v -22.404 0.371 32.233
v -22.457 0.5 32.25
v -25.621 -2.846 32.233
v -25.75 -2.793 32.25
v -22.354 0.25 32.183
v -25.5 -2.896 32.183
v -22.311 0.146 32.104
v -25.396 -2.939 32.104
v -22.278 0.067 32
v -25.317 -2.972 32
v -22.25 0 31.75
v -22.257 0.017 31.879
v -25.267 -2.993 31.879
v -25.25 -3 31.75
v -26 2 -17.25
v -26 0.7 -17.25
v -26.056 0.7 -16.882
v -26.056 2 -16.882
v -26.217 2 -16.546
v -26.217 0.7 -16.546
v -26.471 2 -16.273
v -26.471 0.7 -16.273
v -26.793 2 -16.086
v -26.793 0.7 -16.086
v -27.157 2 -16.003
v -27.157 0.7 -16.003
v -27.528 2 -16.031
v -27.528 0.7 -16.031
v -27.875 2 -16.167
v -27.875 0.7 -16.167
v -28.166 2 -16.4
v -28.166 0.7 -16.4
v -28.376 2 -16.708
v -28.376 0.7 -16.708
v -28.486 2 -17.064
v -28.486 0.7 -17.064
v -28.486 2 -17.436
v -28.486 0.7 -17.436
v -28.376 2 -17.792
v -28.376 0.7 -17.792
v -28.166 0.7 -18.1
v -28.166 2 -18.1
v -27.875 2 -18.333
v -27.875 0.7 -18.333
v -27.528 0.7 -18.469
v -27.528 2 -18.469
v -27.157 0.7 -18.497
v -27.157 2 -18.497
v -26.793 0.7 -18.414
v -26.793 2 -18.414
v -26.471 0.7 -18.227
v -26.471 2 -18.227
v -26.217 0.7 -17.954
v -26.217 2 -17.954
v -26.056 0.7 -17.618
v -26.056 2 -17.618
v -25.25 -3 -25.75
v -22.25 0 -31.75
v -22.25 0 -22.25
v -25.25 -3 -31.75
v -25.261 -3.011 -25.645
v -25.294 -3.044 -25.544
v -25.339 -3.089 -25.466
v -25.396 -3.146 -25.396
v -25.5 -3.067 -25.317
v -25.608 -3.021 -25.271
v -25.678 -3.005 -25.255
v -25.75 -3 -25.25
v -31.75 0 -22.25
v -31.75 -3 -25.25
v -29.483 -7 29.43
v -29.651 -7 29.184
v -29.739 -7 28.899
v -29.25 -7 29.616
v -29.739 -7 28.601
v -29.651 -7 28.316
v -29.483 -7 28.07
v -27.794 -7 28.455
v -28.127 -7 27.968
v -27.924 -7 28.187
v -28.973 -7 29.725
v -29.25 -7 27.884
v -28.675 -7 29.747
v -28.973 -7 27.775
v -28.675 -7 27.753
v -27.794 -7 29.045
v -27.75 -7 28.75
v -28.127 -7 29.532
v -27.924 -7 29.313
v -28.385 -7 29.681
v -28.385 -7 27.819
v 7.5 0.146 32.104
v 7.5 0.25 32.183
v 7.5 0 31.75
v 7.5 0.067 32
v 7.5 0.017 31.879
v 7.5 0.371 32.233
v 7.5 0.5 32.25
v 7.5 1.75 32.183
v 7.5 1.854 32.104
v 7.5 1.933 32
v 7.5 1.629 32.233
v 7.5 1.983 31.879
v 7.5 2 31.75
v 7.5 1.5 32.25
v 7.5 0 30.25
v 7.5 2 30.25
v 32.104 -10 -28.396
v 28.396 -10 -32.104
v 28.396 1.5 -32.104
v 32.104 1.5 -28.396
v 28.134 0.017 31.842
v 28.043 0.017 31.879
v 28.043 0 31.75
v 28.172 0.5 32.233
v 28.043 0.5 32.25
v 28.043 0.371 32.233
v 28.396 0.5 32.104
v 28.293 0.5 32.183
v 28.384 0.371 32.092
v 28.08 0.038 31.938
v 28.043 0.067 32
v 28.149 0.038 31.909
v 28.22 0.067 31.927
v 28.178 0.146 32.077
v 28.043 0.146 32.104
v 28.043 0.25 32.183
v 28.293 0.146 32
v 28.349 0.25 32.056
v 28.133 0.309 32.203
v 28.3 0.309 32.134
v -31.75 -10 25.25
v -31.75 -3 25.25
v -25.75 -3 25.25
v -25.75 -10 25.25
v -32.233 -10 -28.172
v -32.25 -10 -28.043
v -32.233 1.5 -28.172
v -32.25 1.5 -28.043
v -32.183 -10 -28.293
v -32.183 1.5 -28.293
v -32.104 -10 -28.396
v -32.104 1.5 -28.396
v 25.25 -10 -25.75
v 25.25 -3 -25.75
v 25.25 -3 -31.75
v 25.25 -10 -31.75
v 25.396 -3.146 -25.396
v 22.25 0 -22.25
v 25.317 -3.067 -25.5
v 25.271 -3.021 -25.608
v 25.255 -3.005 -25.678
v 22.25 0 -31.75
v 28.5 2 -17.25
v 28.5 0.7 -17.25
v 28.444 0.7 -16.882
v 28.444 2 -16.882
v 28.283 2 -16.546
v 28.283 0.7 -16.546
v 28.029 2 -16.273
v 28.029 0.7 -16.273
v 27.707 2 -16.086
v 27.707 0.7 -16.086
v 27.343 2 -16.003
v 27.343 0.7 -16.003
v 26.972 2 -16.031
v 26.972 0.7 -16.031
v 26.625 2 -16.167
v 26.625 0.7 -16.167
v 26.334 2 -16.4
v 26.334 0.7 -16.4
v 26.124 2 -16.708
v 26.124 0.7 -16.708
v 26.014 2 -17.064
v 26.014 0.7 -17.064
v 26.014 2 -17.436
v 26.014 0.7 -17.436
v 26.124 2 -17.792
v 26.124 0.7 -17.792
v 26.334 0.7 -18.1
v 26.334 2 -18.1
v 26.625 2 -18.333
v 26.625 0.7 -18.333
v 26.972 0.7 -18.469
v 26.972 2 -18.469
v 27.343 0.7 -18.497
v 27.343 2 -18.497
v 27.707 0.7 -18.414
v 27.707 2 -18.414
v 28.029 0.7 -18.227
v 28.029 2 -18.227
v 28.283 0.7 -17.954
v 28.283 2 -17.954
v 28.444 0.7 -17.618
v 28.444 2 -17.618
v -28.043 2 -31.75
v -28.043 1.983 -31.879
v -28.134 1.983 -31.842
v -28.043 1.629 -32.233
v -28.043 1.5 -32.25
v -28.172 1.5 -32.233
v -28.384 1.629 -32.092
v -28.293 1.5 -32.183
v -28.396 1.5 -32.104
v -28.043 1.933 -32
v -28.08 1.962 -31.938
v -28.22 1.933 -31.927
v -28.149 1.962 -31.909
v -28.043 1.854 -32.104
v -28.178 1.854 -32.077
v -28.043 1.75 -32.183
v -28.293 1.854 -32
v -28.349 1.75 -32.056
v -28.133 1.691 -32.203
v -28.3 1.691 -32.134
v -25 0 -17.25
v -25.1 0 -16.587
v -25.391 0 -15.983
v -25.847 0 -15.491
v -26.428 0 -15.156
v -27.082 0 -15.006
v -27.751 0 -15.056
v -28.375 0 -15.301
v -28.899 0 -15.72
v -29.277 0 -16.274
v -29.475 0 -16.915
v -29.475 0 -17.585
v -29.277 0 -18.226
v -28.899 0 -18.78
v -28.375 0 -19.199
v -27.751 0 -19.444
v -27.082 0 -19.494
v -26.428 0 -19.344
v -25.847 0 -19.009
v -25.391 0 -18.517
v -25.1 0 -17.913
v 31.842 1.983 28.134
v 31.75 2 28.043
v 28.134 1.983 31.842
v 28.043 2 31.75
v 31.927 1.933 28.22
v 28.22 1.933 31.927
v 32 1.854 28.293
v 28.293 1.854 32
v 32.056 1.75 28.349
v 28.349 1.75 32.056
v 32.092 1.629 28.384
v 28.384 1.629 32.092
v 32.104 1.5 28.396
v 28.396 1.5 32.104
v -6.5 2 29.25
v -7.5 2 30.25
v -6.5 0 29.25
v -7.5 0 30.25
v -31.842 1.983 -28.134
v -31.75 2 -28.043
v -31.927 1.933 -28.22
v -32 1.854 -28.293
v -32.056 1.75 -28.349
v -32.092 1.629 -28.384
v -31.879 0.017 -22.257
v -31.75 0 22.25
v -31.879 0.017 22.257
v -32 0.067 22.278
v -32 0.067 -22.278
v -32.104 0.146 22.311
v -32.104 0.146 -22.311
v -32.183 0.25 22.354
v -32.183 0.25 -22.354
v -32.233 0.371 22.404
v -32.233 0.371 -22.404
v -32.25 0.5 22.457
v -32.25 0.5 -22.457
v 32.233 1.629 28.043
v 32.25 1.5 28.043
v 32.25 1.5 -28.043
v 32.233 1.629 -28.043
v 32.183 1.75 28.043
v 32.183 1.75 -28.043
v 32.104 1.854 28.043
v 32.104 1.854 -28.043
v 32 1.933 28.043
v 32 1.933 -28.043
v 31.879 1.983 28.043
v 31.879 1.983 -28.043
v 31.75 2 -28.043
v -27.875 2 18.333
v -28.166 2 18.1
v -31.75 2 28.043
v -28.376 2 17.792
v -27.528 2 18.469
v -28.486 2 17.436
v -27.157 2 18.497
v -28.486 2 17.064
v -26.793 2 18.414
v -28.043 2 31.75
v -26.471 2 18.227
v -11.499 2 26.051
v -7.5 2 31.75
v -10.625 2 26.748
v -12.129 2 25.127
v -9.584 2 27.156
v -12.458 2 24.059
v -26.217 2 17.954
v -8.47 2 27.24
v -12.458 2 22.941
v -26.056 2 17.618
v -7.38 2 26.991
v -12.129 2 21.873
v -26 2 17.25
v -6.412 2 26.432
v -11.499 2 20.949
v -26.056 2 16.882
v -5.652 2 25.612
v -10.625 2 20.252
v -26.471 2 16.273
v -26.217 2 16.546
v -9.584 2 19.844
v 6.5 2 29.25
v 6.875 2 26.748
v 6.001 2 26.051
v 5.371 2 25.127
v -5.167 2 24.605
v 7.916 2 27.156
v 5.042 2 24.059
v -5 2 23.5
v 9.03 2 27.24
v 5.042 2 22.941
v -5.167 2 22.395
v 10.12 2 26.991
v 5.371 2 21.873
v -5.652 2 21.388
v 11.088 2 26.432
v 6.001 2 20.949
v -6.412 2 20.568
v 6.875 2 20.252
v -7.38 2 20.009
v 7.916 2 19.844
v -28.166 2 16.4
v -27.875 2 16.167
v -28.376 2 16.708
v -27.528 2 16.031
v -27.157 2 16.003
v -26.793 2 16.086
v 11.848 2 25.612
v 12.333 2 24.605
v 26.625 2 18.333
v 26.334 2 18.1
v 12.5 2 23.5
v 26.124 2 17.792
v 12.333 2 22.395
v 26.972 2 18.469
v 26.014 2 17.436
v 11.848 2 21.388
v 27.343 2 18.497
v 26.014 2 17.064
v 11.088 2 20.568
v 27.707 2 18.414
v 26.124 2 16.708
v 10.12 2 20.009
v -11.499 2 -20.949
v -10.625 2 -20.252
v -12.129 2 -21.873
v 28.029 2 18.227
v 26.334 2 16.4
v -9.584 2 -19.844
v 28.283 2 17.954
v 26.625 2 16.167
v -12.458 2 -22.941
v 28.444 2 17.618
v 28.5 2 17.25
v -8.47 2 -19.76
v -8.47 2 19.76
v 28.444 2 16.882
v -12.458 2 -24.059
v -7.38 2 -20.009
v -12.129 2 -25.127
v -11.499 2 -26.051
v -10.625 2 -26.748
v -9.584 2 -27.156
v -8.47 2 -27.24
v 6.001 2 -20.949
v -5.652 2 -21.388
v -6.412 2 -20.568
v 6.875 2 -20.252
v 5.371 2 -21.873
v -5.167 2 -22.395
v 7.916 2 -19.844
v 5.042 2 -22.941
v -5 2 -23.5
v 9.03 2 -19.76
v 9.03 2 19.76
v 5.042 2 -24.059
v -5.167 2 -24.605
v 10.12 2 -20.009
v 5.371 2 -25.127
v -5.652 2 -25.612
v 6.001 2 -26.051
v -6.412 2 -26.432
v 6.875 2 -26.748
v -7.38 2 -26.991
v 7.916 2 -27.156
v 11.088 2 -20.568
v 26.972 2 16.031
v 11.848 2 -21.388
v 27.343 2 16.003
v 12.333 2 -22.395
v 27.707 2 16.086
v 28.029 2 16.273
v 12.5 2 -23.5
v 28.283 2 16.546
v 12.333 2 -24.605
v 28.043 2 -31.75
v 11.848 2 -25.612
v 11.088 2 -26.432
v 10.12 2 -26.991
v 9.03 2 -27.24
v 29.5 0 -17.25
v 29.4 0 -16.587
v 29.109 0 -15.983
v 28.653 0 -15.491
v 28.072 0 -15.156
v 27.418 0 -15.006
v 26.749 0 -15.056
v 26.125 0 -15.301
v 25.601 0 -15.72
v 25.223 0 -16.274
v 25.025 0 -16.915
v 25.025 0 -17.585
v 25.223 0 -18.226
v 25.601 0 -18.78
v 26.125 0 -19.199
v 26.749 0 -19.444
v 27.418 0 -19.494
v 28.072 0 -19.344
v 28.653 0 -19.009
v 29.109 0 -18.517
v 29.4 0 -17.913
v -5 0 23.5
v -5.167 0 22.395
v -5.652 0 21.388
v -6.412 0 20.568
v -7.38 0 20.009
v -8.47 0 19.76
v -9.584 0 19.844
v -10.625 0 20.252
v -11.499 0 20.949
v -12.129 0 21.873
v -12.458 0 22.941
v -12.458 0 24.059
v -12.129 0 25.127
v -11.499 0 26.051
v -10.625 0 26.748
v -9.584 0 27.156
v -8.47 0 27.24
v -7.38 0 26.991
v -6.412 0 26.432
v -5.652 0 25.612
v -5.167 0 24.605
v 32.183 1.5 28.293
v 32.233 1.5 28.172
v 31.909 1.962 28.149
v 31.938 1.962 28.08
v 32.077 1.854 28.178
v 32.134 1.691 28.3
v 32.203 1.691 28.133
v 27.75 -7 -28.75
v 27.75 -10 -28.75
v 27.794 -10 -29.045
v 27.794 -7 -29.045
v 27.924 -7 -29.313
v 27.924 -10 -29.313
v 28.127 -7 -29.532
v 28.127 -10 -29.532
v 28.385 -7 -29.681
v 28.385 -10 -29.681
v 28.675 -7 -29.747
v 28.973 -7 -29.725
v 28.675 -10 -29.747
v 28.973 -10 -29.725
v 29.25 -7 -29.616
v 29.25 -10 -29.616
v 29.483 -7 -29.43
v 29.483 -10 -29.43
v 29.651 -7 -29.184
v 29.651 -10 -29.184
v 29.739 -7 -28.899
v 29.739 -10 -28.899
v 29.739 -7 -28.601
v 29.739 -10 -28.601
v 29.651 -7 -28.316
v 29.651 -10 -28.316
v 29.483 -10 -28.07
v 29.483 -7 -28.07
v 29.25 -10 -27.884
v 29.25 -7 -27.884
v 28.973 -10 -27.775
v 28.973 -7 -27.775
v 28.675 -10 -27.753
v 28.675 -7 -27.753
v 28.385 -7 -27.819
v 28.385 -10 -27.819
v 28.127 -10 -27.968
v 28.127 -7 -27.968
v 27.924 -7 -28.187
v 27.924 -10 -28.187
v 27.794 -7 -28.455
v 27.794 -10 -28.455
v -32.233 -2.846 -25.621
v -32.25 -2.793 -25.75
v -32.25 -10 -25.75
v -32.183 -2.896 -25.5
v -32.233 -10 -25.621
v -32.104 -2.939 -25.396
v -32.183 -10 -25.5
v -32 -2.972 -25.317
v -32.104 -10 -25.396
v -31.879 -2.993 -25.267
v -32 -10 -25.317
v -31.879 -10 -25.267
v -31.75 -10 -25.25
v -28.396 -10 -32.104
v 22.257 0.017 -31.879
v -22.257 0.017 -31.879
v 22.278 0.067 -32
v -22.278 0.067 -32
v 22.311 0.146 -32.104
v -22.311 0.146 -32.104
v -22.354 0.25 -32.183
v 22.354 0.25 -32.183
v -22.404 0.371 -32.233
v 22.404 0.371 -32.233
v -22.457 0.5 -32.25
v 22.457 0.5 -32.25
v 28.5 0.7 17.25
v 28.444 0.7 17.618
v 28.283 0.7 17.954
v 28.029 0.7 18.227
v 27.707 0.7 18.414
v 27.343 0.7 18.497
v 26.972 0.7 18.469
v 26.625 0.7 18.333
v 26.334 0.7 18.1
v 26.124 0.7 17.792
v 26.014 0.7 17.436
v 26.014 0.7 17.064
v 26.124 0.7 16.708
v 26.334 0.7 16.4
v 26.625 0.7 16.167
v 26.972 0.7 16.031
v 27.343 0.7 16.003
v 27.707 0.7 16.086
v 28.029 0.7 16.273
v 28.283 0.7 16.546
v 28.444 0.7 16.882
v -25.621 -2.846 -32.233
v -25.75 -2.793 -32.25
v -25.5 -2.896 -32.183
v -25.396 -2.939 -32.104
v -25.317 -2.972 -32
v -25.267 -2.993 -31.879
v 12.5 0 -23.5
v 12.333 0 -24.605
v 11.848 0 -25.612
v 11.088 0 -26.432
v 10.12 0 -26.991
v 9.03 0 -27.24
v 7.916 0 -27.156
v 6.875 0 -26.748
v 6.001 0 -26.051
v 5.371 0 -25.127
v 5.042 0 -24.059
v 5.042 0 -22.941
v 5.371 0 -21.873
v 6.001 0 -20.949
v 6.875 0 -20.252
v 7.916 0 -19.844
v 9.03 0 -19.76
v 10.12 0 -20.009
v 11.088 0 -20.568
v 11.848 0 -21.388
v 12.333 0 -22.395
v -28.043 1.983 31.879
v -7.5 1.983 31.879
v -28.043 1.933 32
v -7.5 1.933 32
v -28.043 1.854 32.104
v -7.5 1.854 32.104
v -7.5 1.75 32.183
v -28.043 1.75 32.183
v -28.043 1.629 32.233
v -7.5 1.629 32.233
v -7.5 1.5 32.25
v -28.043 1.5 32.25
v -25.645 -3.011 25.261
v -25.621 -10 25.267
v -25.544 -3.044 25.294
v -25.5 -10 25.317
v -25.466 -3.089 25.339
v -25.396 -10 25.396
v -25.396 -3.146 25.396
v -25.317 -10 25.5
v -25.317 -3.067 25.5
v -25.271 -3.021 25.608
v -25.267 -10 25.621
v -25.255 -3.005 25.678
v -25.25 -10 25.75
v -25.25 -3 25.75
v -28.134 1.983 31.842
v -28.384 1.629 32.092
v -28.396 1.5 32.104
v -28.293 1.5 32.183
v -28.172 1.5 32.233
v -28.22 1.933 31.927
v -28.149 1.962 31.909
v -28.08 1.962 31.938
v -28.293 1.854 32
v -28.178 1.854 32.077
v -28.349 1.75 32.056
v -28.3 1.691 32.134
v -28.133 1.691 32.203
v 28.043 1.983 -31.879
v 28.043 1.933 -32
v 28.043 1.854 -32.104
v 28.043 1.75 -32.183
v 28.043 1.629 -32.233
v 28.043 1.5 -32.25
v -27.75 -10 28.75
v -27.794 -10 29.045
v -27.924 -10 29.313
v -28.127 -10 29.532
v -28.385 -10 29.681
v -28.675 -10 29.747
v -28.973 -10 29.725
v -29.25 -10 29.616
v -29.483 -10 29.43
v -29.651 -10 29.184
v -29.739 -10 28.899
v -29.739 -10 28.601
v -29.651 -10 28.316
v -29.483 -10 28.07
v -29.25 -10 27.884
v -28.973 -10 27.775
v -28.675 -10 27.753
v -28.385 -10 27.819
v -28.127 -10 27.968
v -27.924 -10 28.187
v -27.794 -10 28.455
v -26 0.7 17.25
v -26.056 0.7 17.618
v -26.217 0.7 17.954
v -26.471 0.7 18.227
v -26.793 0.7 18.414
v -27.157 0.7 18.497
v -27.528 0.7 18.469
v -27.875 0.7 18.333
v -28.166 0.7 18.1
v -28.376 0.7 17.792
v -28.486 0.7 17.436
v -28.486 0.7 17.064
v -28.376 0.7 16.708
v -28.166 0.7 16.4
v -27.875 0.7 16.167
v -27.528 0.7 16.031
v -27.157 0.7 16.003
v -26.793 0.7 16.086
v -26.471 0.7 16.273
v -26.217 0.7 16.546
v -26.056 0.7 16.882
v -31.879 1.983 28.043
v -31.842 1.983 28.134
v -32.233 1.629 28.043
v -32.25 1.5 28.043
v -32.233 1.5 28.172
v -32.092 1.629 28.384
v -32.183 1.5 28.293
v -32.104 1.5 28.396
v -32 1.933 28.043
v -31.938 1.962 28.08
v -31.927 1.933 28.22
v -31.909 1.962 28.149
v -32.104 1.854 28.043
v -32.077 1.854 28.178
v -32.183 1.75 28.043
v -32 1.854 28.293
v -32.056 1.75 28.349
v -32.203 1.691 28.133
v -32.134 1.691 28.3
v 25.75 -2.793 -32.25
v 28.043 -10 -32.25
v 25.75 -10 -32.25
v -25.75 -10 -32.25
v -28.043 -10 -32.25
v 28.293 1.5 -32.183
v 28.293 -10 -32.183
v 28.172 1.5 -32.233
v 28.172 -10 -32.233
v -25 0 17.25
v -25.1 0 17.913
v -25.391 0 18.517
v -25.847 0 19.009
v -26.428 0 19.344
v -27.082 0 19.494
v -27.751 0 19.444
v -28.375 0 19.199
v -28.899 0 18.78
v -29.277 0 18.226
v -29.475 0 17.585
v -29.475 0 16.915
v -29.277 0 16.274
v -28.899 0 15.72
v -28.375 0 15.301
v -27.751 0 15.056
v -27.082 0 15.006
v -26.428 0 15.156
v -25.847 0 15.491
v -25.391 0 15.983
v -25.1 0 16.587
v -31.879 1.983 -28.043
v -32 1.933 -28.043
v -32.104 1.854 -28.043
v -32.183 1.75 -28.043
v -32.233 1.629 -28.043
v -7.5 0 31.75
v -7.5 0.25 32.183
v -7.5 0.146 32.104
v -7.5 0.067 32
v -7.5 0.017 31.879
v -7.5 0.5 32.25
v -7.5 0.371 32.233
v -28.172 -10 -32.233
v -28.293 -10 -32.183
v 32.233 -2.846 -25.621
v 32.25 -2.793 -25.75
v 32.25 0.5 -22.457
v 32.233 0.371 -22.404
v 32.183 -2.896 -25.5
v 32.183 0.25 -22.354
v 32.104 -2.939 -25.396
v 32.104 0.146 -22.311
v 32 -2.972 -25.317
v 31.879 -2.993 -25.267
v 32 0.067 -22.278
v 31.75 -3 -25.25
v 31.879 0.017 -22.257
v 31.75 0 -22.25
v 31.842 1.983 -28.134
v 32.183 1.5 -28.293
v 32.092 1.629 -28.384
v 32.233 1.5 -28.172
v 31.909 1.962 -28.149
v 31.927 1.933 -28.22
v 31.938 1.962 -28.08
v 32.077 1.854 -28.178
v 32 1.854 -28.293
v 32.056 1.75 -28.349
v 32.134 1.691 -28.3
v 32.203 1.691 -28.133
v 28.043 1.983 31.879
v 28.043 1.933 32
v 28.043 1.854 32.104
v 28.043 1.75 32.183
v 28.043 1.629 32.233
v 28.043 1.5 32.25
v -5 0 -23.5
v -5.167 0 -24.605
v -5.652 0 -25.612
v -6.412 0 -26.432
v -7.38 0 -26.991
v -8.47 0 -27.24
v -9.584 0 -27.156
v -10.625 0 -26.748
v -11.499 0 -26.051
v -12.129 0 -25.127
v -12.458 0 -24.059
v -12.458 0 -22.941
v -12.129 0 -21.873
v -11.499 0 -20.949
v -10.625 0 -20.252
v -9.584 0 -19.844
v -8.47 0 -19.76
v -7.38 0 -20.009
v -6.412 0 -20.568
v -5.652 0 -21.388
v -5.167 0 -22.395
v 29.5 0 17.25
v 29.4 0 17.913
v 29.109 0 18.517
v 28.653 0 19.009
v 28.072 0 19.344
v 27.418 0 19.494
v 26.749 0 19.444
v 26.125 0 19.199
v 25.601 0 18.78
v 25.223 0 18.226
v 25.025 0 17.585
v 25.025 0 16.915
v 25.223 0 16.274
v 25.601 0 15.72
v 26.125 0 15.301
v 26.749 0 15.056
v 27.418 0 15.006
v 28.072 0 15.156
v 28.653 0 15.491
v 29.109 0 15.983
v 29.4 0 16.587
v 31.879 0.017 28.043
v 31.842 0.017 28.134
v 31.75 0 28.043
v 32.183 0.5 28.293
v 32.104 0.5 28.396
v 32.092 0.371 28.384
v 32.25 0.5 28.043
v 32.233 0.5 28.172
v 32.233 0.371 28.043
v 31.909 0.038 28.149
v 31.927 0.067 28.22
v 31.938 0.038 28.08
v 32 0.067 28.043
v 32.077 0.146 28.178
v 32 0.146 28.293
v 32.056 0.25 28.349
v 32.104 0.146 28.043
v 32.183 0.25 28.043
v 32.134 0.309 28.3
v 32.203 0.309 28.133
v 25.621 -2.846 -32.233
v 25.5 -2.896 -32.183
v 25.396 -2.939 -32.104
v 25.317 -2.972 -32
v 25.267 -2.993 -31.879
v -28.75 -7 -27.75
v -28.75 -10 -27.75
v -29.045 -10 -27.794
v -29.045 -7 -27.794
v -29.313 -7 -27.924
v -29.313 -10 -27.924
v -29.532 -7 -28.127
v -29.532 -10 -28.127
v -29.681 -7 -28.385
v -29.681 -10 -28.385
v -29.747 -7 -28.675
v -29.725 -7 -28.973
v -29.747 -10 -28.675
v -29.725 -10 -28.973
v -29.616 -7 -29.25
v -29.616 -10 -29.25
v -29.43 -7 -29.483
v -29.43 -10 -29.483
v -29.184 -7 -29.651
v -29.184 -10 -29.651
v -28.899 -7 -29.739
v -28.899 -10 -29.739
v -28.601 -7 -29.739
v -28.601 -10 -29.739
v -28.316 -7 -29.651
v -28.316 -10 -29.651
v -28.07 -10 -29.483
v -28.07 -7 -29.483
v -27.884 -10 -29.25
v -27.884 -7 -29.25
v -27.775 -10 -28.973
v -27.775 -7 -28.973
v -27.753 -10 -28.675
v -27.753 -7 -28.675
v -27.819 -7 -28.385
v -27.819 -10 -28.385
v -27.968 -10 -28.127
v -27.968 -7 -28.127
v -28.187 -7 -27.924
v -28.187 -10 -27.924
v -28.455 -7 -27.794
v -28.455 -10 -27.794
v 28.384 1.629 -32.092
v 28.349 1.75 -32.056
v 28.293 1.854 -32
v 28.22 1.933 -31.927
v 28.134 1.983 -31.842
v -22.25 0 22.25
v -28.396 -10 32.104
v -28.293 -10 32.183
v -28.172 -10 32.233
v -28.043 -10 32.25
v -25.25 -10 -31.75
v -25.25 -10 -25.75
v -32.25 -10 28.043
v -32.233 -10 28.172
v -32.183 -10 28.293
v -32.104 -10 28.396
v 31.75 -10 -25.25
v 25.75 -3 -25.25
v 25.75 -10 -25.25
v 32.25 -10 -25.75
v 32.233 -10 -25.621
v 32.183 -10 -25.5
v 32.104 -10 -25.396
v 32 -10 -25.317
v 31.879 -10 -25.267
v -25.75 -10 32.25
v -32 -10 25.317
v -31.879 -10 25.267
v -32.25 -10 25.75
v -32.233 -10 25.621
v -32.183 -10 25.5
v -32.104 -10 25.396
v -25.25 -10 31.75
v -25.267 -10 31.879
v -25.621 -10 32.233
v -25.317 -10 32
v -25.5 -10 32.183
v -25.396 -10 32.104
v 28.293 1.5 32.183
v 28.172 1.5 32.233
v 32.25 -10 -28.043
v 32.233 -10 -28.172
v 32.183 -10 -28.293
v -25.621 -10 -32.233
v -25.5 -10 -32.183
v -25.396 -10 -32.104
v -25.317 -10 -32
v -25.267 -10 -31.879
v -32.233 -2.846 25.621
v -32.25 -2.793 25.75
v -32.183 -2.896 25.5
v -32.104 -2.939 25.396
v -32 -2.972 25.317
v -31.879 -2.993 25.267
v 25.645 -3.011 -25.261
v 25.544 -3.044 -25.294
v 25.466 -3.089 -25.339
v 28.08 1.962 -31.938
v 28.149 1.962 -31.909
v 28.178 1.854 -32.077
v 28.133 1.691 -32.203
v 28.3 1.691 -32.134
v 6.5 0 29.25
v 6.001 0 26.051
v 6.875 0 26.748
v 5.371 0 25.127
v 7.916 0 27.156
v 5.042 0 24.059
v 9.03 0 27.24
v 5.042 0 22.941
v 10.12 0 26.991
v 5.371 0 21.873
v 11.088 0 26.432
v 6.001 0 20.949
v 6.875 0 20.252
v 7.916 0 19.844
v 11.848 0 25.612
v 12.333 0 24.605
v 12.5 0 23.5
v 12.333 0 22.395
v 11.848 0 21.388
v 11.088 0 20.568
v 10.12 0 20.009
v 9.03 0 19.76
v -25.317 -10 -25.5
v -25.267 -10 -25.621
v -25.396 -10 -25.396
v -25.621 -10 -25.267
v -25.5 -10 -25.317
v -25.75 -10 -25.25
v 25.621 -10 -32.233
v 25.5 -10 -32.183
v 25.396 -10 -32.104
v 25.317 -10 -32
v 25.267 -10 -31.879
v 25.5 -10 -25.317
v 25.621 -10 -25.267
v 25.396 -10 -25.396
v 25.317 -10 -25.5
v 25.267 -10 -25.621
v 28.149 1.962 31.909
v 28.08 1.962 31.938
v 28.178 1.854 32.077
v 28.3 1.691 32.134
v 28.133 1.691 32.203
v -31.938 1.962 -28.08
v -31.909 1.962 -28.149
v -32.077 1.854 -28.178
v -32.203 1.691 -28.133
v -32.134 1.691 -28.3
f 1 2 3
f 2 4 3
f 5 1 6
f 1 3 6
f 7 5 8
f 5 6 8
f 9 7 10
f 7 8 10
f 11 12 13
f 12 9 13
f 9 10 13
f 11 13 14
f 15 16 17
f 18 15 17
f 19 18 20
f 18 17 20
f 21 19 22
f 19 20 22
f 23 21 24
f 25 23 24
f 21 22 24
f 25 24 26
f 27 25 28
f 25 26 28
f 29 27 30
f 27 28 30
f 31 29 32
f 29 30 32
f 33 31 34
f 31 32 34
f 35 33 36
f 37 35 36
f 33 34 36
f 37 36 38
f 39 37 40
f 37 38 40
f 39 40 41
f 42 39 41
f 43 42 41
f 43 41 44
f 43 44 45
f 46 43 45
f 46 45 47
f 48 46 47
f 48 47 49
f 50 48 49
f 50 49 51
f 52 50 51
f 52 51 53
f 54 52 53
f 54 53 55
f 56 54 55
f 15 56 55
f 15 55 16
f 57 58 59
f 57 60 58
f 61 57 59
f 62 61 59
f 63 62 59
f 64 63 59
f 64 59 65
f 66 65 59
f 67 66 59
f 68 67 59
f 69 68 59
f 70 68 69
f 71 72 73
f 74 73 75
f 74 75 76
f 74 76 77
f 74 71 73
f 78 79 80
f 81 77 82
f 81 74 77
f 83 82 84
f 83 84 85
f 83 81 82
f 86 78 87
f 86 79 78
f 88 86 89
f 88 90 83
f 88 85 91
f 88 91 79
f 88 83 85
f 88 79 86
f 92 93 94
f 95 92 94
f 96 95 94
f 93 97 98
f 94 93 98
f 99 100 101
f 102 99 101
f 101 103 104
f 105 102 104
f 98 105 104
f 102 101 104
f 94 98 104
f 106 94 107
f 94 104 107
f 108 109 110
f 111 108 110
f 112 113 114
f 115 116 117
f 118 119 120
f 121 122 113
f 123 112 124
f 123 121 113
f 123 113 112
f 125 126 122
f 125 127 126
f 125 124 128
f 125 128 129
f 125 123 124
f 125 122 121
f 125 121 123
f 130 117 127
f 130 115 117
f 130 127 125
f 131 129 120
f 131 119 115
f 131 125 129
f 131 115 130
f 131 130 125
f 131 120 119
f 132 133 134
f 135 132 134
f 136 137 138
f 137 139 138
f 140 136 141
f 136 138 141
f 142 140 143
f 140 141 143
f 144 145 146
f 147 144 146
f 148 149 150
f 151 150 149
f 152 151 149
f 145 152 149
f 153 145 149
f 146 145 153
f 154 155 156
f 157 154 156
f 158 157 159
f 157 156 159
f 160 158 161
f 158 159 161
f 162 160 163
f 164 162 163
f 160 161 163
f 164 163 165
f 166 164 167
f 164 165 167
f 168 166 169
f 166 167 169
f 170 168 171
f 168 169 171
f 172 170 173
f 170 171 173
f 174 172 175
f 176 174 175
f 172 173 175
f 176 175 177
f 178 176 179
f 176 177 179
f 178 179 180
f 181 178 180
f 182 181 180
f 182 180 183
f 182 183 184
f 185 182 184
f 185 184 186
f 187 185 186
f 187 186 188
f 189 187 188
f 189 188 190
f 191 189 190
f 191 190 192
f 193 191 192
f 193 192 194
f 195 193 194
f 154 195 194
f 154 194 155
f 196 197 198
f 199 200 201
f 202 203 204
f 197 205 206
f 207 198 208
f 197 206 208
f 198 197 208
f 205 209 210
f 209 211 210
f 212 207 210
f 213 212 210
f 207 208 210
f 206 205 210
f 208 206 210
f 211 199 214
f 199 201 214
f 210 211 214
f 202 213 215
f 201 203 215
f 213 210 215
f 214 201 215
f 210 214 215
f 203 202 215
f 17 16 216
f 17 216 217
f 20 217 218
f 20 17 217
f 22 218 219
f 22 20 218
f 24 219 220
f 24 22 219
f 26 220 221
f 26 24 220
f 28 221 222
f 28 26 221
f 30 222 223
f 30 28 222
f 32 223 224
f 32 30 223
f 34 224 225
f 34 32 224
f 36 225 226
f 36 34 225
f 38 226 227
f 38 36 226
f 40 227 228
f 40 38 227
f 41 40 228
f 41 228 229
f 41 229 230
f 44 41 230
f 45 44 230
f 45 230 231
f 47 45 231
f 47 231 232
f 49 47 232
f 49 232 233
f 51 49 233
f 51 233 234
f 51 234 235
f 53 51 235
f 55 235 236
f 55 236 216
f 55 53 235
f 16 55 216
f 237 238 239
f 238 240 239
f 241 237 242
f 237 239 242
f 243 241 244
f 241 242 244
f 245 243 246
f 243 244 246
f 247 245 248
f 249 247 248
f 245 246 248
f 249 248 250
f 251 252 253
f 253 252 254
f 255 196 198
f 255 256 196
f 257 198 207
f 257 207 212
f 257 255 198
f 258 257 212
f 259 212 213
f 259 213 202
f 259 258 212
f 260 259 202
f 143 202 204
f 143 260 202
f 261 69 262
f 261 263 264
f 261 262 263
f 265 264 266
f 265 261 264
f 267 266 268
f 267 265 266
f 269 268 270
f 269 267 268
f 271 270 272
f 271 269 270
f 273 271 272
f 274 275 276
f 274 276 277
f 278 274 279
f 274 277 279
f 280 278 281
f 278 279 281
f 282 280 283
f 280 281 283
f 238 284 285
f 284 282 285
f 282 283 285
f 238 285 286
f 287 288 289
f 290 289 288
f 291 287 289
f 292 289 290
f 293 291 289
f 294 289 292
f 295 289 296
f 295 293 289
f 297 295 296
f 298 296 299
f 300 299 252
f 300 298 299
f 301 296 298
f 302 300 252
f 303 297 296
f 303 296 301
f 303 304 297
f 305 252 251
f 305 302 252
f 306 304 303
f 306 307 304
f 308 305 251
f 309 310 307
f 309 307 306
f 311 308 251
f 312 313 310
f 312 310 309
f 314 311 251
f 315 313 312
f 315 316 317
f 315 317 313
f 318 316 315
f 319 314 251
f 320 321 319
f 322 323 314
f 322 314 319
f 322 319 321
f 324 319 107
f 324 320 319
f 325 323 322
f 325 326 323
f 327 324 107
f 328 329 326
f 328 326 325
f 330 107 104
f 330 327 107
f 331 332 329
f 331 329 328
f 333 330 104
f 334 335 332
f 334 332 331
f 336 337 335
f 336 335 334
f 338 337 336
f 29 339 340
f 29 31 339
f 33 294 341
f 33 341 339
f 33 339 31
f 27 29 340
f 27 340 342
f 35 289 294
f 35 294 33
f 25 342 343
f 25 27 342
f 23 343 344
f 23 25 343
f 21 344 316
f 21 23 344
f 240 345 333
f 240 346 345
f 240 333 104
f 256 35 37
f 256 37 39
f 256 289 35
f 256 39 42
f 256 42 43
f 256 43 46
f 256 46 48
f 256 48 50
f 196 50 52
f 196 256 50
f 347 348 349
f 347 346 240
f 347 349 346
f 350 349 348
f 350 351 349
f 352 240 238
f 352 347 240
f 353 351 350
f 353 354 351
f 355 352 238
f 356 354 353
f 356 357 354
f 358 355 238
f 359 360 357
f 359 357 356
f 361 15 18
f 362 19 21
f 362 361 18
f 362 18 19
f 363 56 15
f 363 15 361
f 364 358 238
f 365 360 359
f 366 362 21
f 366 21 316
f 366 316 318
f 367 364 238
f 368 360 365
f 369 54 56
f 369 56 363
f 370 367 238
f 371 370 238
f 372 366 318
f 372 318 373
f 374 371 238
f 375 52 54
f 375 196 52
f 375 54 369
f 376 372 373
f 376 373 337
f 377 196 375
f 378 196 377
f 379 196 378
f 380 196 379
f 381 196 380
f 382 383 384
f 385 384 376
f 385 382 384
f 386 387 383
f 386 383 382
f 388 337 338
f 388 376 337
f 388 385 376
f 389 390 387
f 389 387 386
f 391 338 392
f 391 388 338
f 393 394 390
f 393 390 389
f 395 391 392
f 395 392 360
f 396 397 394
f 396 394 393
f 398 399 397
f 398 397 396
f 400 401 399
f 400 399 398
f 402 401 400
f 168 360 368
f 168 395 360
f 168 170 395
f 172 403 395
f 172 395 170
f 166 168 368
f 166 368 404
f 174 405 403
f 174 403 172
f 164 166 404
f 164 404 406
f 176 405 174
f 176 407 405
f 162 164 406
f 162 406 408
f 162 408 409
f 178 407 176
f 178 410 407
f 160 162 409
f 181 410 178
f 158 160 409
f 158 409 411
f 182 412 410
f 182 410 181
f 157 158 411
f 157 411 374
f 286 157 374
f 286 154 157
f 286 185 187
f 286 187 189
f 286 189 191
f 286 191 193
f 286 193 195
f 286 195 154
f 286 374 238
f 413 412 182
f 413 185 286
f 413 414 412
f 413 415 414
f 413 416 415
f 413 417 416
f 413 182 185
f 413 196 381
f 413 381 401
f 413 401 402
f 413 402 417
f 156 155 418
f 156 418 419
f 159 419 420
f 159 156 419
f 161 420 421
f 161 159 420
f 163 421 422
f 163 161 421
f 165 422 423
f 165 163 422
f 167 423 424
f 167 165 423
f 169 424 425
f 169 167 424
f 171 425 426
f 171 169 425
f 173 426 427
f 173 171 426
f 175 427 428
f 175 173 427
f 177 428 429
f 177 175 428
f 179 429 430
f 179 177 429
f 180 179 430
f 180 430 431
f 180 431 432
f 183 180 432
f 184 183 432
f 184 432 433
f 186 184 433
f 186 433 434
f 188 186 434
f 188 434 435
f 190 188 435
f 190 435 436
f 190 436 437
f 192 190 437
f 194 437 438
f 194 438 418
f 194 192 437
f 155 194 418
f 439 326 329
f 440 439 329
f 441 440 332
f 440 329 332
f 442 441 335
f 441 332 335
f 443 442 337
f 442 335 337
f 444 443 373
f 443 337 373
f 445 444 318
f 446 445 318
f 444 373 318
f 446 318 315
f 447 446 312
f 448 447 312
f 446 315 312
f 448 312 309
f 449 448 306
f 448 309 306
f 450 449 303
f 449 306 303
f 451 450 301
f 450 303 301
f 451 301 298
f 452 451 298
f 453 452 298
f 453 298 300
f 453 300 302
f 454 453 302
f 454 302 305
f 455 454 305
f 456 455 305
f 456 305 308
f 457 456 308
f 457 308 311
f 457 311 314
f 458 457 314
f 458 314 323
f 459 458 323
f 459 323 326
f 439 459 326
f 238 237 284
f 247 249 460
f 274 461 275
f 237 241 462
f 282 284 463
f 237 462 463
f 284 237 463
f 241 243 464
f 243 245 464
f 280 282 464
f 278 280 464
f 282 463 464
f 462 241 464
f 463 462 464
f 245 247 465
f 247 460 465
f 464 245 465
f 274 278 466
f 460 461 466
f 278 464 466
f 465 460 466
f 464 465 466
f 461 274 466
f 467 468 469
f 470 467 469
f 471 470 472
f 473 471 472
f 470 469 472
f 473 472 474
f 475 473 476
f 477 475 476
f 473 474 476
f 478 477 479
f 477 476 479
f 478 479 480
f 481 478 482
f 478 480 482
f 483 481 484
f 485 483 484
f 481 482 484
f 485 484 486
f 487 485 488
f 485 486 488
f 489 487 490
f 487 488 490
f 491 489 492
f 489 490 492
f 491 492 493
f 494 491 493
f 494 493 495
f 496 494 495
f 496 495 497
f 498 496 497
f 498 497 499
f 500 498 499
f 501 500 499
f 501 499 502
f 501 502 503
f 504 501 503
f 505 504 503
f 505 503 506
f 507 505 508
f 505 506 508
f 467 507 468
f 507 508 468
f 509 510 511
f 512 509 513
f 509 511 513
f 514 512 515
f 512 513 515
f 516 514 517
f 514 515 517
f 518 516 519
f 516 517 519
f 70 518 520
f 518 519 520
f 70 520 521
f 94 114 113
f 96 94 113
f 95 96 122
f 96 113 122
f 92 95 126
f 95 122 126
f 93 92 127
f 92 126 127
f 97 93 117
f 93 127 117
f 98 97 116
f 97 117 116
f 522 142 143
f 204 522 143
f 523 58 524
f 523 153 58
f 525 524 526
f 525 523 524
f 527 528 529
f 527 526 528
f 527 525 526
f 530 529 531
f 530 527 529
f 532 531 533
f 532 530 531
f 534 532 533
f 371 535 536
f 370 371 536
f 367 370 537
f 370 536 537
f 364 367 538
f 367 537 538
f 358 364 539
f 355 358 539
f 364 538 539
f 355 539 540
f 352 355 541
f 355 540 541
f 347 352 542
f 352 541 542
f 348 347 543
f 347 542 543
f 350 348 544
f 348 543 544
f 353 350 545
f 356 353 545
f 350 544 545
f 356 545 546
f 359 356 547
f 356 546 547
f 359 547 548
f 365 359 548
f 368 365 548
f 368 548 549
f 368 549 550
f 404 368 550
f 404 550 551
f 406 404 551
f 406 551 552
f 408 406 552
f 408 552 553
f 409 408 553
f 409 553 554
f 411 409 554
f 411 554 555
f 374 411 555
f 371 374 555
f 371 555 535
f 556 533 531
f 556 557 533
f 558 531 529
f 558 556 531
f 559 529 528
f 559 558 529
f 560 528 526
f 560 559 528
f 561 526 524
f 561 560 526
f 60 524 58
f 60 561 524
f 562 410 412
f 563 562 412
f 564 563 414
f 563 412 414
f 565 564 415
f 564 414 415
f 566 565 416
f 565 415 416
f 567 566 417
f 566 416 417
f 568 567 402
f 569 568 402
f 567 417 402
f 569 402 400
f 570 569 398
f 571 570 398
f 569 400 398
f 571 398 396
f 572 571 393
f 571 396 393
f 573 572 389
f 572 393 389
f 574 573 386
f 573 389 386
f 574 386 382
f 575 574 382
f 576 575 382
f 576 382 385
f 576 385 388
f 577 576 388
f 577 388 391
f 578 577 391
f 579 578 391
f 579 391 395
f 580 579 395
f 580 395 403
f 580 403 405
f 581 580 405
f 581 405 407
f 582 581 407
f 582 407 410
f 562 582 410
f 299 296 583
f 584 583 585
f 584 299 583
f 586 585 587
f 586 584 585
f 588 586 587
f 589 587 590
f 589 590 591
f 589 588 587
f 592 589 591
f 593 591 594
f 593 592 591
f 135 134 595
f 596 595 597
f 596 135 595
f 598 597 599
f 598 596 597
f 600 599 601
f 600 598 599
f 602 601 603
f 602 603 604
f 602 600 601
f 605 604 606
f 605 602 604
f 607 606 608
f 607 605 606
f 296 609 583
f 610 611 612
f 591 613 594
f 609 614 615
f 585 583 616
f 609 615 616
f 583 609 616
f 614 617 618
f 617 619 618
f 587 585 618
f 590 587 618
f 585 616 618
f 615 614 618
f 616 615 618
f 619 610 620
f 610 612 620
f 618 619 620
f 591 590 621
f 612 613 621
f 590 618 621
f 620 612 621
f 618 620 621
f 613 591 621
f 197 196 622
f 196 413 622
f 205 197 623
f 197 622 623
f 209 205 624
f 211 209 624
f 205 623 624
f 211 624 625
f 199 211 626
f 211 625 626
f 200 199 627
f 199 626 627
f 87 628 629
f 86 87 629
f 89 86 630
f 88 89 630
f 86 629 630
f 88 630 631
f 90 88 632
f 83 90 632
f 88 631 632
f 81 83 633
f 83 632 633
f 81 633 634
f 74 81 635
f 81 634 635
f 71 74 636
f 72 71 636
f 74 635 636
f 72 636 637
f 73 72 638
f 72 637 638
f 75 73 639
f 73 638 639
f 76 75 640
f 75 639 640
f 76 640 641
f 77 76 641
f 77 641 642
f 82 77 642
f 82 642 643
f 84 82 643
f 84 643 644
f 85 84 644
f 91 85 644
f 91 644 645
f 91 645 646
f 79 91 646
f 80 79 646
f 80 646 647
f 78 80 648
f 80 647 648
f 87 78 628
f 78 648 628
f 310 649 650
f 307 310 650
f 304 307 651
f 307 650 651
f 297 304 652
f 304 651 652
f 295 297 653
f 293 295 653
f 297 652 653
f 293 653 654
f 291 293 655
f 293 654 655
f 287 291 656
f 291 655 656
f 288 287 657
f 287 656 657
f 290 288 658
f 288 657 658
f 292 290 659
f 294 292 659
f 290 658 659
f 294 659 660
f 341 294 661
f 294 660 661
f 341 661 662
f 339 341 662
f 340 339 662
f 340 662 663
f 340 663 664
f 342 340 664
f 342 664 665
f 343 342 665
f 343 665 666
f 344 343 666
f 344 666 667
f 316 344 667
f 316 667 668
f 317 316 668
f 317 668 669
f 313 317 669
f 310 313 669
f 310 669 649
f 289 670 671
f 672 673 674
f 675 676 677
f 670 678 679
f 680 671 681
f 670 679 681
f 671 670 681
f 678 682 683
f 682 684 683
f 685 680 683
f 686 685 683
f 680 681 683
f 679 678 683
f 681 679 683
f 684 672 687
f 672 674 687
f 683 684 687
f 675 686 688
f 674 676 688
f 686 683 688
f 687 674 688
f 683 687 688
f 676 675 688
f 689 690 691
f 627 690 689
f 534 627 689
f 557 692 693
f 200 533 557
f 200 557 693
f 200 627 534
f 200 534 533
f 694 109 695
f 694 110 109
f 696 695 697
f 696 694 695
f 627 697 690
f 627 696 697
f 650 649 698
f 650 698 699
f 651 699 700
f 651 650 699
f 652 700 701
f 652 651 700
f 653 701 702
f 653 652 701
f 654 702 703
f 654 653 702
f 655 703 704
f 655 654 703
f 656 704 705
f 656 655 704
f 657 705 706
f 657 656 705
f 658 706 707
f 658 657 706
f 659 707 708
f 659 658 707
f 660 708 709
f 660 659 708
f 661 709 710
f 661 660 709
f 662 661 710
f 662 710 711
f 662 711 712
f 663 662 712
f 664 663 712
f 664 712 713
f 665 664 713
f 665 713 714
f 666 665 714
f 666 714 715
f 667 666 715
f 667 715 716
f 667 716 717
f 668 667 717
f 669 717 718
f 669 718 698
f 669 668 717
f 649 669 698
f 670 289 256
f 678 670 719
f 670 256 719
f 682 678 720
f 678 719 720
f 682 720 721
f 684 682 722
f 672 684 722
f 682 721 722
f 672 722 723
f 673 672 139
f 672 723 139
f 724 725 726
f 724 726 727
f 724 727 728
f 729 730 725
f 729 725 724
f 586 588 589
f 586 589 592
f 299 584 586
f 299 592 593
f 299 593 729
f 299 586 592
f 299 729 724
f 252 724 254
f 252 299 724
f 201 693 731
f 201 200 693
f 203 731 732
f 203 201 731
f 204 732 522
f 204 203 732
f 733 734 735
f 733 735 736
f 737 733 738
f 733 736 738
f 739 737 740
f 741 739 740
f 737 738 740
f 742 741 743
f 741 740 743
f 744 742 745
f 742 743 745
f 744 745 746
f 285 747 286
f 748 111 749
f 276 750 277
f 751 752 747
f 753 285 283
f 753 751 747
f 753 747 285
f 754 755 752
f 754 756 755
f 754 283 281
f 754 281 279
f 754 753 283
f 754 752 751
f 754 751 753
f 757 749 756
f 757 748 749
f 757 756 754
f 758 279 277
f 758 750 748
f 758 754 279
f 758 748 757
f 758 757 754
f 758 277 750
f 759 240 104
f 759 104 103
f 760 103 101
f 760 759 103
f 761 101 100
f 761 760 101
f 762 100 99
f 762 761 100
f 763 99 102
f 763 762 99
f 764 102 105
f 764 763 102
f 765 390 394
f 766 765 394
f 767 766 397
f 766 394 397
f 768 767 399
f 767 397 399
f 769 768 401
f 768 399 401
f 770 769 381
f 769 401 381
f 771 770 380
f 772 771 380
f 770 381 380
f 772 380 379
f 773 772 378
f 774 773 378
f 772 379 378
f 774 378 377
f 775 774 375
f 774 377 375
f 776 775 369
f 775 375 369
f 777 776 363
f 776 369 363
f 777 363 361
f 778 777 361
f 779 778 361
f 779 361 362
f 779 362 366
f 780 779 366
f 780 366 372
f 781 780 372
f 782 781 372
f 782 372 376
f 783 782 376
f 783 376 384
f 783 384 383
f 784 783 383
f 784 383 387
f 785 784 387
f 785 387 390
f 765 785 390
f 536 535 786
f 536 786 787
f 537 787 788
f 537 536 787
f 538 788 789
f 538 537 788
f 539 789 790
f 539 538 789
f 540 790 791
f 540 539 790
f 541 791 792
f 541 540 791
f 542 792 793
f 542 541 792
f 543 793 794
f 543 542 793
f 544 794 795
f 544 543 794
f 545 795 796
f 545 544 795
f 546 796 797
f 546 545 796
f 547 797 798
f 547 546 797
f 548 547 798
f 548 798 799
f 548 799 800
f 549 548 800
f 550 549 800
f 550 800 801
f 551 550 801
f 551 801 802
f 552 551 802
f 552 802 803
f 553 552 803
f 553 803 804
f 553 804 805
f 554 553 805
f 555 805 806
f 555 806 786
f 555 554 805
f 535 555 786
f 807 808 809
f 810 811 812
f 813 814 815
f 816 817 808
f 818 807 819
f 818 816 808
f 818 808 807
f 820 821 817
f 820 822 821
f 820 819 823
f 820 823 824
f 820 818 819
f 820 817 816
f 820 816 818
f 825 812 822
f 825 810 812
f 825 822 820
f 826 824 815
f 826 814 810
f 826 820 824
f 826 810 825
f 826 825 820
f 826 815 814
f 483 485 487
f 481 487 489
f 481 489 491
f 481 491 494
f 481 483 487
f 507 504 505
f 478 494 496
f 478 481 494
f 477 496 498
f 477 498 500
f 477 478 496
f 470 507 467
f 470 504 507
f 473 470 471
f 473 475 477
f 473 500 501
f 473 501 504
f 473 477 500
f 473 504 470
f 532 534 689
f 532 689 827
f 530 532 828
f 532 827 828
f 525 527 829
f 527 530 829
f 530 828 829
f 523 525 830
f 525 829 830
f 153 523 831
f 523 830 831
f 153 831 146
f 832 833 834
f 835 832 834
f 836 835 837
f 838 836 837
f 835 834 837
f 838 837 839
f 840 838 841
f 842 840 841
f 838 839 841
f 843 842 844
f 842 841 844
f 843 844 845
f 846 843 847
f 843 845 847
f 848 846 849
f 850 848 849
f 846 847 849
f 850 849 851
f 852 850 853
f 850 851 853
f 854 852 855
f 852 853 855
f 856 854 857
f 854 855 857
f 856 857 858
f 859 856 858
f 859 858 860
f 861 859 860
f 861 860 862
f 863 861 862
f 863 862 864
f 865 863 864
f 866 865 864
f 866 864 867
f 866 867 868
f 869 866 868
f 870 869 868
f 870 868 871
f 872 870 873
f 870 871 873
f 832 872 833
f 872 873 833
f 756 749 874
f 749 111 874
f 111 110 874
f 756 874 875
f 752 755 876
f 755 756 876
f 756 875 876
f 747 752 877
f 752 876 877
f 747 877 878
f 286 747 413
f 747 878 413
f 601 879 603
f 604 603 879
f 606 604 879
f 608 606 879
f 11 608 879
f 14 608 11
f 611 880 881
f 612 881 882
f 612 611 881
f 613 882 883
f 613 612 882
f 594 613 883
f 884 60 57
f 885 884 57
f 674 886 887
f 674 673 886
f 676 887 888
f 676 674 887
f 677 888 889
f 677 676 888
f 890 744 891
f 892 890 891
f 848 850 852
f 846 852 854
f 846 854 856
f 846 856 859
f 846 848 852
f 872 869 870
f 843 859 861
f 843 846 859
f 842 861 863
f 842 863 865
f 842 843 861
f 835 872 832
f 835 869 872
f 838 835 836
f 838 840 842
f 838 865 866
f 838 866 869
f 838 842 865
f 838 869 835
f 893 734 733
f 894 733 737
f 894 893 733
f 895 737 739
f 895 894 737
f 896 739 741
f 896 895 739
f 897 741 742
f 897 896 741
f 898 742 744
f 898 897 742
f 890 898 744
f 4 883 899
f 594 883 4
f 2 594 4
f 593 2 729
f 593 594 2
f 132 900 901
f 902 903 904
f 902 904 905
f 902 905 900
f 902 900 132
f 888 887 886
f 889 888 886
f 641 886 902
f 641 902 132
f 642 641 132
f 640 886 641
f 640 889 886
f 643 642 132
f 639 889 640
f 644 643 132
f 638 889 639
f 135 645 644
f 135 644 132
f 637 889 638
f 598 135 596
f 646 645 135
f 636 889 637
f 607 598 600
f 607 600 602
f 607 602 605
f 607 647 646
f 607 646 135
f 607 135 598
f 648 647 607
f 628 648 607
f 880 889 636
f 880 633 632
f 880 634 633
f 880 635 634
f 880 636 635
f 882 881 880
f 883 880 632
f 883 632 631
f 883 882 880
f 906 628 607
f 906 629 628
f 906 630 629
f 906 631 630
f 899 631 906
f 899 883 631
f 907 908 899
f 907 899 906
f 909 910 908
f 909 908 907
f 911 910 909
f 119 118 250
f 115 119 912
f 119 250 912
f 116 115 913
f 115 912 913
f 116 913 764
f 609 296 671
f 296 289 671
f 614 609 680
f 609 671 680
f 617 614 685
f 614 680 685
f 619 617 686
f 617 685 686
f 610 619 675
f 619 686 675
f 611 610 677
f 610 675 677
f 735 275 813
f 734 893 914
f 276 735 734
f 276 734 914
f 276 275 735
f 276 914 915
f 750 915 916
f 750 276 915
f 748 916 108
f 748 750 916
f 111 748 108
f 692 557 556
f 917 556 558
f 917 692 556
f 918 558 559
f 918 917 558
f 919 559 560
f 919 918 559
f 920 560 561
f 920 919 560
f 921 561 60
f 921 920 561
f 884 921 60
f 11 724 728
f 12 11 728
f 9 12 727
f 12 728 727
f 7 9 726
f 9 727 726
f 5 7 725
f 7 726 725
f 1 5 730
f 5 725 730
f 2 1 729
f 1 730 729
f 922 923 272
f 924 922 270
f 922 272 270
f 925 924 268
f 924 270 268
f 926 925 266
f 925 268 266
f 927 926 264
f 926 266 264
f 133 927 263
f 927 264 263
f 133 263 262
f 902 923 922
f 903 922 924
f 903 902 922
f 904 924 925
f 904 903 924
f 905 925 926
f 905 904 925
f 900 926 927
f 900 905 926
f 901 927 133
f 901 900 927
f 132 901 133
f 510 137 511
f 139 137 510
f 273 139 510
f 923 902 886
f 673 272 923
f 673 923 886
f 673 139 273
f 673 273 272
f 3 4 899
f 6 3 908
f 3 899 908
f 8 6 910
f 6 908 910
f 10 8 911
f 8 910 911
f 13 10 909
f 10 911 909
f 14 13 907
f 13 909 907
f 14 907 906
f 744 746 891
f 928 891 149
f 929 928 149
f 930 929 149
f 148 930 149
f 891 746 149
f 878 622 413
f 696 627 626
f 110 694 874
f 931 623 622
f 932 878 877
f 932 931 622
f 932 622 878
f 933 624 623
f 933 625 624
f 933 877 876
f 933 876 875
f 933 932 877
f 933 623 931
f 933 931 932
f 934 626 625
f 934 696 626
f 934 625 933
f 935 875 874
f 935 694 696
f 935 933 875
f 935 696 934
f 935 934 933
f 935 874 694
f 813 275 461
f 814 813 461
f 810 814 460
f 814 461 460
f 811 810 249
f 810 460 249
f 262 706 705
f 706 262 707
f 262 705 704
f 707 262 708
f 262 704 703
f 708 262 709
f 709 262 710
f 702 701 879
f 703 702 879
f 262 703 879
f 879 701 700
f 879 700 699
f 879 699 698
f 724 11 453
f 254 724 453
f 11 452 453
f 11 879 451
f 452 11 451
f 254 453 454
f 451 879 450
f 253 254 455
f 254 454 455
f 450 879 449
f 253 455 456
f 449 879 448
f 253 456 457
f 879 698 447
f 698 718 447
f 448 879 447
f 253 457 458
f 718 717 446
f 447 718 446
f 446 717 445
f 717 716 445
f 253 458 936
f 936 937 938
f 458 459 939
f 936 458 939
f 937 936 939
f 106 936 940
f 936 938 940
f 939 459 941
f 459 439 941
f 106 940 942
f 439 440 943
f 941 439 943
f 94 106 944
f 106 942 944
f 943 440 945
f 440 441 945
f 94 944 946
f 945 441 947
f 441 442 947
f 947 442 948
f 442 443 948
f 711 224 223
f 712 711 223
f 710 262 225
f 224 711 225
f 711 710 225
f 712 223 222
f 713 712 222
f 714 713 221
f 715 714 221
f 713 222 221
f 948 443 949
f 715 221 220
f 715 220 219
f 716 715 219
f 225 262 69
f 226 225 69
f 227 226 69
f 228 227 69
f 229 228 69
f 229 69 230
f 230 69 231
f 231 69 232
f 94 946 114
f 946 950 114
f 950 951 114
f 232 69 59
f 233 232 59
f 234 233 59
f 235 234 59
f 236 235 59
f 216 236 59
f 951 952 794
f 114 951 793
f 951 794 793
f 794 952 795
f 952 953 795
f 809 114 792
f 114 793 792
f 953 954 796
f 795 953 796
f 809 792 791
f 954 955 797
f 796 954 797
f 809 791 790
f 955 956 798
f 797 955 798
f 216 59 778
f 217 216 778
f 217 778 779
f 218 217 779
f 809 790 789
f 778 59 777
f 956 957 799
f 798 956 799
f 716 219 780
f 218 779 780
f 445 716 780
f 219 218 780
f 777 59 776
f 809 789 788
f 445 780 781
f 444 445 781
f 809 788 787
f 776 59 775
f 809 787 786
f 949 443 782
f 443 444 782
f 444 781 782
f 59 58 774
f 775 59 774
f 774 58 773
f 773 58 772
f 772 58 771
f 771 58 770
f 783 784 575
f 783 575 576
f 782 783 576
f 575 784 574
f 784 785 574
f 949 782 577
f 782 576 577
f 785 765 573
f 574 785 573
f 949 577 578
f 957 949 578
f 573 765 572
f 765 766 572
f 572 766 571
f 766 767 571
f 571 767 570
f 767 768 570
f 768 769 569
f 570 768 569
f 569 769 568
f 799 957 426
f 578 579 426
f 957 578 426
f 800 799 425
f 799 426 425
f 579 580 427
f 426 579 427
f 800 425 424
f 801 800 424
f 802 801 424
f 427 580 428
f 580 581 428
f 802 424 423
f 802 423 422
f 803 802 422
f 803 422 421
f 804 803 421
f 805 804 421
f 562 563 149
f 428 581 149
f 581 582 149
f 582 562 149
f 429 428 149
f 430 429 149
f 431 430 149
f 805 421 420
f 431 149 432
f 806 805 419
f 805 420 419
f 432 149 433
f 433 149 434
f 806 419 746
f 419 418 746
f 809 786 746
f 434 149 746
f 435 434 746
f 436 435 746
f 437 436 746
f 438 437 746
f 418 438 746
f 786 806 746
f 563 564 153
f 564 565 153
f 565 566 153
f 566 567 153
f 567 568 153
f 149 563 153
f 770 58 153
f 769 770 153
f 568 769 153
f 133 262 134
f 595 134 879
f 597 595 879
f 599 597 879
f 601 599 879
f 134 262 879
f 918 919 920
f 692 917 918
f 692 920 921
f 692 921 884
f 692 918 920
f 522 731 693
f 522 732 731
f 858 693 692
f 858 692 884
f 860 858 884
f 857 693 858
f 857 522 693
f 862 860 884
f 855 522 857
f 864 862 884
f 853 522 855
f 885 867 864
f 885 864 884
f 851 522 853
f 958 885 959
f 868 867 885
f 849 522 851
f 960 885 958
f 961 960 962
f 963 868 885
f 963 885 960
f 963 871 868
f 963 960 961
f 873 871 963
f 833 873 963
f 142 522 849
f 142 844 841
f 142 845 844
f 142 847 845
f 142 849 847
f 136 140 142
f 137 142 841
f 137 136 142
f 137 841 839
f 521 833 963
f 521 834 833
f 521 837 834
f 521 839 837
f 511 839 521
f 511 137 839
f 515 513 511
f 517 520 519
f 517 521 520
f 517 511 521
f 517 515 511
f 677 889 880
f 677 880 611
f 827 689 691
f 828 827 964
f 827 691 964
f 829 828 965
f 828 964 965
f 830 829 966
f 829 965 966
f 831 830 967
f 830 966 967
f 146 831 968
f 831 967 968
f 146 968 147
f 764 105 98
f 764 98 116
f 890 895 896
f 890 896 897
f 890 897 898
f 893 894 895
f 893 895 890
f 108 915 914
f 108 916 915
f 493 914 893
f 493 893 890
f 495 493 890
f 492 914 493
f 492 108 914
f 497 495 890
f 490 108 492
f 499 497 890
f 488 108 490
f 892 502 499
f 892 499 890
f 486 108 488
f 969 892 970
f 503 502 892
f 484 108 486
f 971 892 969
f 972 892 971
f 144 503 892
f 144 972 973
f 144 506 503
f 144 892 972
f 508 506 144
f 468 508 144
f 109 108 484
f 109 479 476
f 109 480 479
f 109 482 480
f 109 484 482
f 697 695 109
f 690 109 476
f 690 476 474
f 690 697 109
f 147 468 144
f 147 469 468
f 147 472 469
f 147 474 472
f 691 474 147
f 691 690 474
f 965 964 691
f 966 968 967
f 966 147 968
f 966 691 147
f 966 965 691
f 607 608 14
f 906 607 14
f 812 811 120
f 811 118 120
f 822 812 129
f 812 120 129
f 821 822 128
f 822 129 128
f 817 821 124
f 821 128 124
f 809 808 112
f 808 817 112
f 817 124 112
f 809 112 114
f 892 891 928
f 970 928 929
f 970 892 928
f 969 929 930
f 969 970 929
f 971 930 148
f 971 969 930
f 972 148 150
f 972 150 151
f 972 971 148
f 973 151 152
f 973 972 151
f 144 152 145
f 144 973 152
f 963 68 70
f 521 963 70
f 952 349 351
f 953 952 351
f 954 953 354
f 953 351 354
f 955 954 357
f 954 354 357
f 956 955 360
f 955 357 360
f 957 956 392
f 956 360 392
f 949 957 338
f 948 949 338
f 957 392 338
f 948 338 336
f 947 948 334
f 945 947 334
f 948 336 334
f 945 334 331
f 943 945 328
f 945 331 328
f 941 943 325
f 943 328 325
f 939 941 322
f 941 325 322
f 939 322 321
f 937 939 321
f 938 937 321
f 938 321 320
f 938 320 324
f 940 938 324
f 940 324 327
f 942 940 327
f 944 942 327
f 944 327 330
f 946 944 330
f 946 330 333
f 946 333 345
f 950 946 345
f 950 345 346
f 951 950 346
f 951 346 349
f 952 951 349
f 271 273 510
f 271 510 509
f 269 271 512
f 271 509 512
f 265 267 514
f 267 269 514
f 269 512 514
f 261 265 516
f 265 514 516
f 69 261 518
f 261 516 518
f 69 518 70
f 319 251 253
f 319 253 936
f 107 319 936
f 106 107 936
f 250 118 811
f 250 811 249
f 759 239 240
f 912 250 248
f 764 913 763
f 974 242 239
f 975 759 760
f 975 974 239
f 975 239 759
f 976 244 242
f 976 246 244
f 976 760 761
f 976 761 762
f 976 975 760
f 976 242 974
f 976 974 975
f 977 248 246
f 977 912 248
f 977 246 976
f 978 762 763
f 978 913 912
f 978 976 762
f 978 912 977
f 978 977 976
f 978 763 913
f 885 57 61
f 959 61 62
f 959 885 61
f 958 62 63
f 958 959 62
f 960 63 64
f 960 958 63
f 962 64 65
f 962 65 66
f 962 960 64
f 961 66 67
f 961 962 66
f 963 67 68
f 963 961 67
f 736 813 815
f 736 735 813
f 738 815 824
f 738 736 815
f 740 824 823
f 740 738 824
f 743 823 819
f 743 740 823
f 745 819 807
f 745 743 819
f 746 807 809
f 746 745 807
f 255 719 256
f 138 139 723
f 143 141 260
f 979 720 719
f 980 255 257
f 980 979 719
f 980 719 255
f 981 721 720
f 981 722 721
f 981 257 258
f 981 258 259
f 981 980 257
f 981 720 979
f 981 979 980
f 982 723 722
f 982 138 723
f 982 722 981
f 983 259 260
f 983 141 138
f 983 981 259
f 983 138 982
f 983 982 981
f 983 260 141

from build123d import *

# Parameters (mm, degrees)
SKETCH2_W                    = 64.5
SKETCH2_H                    = 64.5
BOSS_EXTRUDE1_DEPTH          = 2
SKETCH3_W                    = 7
SKETCH3_H                    = 7
BOSS_EXTRUDE2_DEPTH          = 10
SKETCH6_R                    = 1
CUT_EXTRUDE2_DEPTH           = 3
CHAMFER3_SIZE                = 3
CIRPATTERN1_COUNT            = 3
CIRPATTERN1_ANGLE            = 180
CHAMFER3_OF_CIRPATTERN1_SIZE = 3
CHAMFER8_SIZE                = 4
FILLET4_R                    = 0.5
SKETCH12_W                   = 15
SKETCH12_H                   = 3
CUT_EXTRUDE3_DEPTH           = 10
CHAMFER9_SIZE                = 1
SKETCH13_R                   = 3.75
CUT_EXTRUDE4_DEPTH           = 10
SKETCH16_R                   = 1.25
CUT_EXTRUDE6_DEPTH           = 10
CHAMFER10_SIZE               = 1
CHAMFER10_SIZE2              = 0.700207538


with BuildPart() as part:
    # Sketch2 → Boss-Extrude1 (new body)
    with BuildSketch(Plane(origin=(0, 0, 0), x_dir=(1, 0, 0), z_dir=(0, 1, 0))):
        Rectangle(SKETCH2_W, SKETCH2_H)
    extrude(amount=BOSS_EXTRUDE1_DEPTH)

    # Sketch3 → Boss-Extrude2 (add)
    with BuildSketch(Plane.XZ):
        with Locations((-28.75, 28.75)):
            Rectangle(SKETCH3_W, SKETCH3_H)
    boss_extrude2 = extrude(amount=BOSS_EXTRUDE2_DEPTH)

    # Sketch6 → Cut-Extrude2 (cut)
    with BuildSketch(Plane.XZ.offset(10)):
        with Locations((-28.75, 28.75)):
            Circle(SKETCH6_R)
    cut_extrude2 = extrude(amount=-CUT_EXTRUDE2_DEPTH, mode=Mode.SUBTRACT)

    # Chamfer3
    chamfer3_edges = [part.edges().sort_by_distance(p)[0] for p in [
        (-28.75, 0, 25.25),
        (-25.25, 0, 28.75),
    ]]
    chamfer(chamfer3_edges, length=CHAMFER3_SIZE)

    # CirPattern1: Boss-Extrude2, Cut-Extrude2 ×3 about axis
    cirpattern1_axis = Axis((0, 0, 0), (0, -1, 0))
    for i in range(1, CIRPATTERN1_COUNT):
        add(boss_extrude2.rotate(cirpattern1_axis, i * CIRPATTERN1_ANGLE / (CIRPATTERN1_COUNT - 1)))
        add(cut_extrude2.rotate(cirpattern1_axis, i * CIRPATTERN1_ANGLE / (CIRPATTERN1_COUNT - 1)), mode=Mode.SUBTRACT)

    # Chamfer3 of CirPattern1
    chamfer3_of_cirpattern1_edges = [part.edges().sort_by_distance(p)[0] for p in [
        (-25.25, 0, -28.75),
        (-28.75, 0, -25.25),
        (28.75, 0, -25.25),
        (25.25, 0, -28.75),
    ]]
    chamfer(chamfer3_of_cirpattern1_edges, length=CHAMFER3_OF_CIRPATTERN1_SIZE)

    # Chamfer8
    chamfer8_edges = [part.edges().sort_by_distance(p)[0] for p in [
        (32.25, 1, 32.25),
        (-32.25, -4, 32.25),
        (-32.25, -4, -32.25),
        (32.25, -4, -32.25),
    ]]
    chamfer(chamfer8_edges, length=CHAMFER8_SIZE)

    # Fillet4
    fillet4_edges = [part.edges().sort_by_distance(p)[0] for p in [
        (30.25, 0, 30.25),
        (0, 2, 32.25),
        (-28.25, -4, 32.25),
        (28.25, 1, 32.25),
        (0, 2, -32.25),
        (-32.25, 2, 0),
        (-30.25, 2, 30.25),
        (-30.25, 2, -30.25),
        (30.25, 2, -30.25),
        (30.25, 2, 30.25),
        (-28.25, -4, -32.25),
        (28.25, -4, -32.25),
        (-32.25, -4, 28.25),
        (-32.25, -4, -28.25),
        (-32.25, -6.5, 25.25),
        (-25.25, -6.5, 25.25),
        (-25.25, -6.5, 32.25),
        (3, 0, 32.25),
        (-23.75, -1.5, 32.25),
        (-32.25, -1.5, 23.75),
        (-25.25, -6.5, -32.25),
        (-25.25, -6.5, -25.25),
        (-32.25, -6.5, -25.25),
        (32.25, -6.5, -25.25),
        (25.25, -6.5, -25.25),
        (25.25, -6.5, -32.25),
        (-32.25, 0, 0),
        (-32.25, -1.5, -23.75),
        (-23.75, -1.5, -32.25),
        (0, 0, -32.25),
        (23.75, -1.5, -32.25),
        (32.25, -1.5, -23.75),
        (32.25, 0, 3),
        (32.25, 2, 0),
        (32.25, -4, -28.25),
        (32.25, 1, 28.25),
    ]]
    fillet(fillet4_edges, radius=FILLET4_R)

    # Sketch12 → Cut-Extrude3 (cut)
    with BuildSketch(Plane(origin=(0, 2, 0), x_dir=(1, 0, 0), z_dir=(0, 1, 0))):
        with Locations((0, -30.75)):
            Rectangle(SKETCH12_W, SKETCH12_H)
    extrude(amount=-CUT_EXTRUDE3_DEPTH, mode=Mode.SUBTRACT)

    # Chamfer9
    chamfer9_edges = [part.edges().sort_by_distance(p)[0] for p in [
        (-7.5, 1, 29.25),
        (7.5, 1, 29.25),
    ]]
    chamfer(chamfer9_edges, length=CHAMFER9_SIZE)

    # Sketch13 → Cut-Extrude4 (cut)
    with BuildSketch(Plane(origin=(0, 2, 0), x_dir=(1, 0, 0), z_dir=(0, 1, 0))):
        with Locations((8.75, -23.5)):
            Circle(SKETCH13_R)
        with Locations((-8.75, -23.5)):
            Circle(SKETCH13_R)
        with Locations((-8.75, 23.5)):
            Circle(SKETCH13_R)
        with Locations((8.75, 23.5)):
            Circle(SKETCH13_R)
    extrude(amount=-CUT_EXTRUDE4_DEPTH, mode=Mode.SUBTRACT)

    # Sketch16 → Cut-Extrude6 (cut)
    with BuildSketch(Plane.XZ):
        with Locations((-27.25, -17.25)):
            Circle(SKETCH16_R)
        with Locations((-27.25, 17.25)):
            Circle(SKETCH16_R)
        with Locations((27.25, -17.25)):
            Circle(SKETCH16_R)
        with Locations((27.25, 17.25)):
            Circle(SKETCH16_R)
    extrude(amount=-CUT_EXTRUDE6_DEPTH, mode=Mode.SUBTRACT)

    # Chamfer10
    chamfer10_edges = [part.edges().sort_by_distance(p)[0] for p in [
        (-28.5, 0, 17.25),
        (26, 0, -17.25),
        (26, 0, 17.25),
        (-28.5, 0, -17.25),
    ]]
    chamfer10_side = [part.faces().sort_by_distance(p)[0] for p in [
        (0.632372559, 0, 0.31600784),
    ]]
    chamfer(chamfer10_edges, length=CHAMFER10_SIZE, length2=CHAMFER10_SIZE2, reference=chamfer10_side[0])


solid = part.part
